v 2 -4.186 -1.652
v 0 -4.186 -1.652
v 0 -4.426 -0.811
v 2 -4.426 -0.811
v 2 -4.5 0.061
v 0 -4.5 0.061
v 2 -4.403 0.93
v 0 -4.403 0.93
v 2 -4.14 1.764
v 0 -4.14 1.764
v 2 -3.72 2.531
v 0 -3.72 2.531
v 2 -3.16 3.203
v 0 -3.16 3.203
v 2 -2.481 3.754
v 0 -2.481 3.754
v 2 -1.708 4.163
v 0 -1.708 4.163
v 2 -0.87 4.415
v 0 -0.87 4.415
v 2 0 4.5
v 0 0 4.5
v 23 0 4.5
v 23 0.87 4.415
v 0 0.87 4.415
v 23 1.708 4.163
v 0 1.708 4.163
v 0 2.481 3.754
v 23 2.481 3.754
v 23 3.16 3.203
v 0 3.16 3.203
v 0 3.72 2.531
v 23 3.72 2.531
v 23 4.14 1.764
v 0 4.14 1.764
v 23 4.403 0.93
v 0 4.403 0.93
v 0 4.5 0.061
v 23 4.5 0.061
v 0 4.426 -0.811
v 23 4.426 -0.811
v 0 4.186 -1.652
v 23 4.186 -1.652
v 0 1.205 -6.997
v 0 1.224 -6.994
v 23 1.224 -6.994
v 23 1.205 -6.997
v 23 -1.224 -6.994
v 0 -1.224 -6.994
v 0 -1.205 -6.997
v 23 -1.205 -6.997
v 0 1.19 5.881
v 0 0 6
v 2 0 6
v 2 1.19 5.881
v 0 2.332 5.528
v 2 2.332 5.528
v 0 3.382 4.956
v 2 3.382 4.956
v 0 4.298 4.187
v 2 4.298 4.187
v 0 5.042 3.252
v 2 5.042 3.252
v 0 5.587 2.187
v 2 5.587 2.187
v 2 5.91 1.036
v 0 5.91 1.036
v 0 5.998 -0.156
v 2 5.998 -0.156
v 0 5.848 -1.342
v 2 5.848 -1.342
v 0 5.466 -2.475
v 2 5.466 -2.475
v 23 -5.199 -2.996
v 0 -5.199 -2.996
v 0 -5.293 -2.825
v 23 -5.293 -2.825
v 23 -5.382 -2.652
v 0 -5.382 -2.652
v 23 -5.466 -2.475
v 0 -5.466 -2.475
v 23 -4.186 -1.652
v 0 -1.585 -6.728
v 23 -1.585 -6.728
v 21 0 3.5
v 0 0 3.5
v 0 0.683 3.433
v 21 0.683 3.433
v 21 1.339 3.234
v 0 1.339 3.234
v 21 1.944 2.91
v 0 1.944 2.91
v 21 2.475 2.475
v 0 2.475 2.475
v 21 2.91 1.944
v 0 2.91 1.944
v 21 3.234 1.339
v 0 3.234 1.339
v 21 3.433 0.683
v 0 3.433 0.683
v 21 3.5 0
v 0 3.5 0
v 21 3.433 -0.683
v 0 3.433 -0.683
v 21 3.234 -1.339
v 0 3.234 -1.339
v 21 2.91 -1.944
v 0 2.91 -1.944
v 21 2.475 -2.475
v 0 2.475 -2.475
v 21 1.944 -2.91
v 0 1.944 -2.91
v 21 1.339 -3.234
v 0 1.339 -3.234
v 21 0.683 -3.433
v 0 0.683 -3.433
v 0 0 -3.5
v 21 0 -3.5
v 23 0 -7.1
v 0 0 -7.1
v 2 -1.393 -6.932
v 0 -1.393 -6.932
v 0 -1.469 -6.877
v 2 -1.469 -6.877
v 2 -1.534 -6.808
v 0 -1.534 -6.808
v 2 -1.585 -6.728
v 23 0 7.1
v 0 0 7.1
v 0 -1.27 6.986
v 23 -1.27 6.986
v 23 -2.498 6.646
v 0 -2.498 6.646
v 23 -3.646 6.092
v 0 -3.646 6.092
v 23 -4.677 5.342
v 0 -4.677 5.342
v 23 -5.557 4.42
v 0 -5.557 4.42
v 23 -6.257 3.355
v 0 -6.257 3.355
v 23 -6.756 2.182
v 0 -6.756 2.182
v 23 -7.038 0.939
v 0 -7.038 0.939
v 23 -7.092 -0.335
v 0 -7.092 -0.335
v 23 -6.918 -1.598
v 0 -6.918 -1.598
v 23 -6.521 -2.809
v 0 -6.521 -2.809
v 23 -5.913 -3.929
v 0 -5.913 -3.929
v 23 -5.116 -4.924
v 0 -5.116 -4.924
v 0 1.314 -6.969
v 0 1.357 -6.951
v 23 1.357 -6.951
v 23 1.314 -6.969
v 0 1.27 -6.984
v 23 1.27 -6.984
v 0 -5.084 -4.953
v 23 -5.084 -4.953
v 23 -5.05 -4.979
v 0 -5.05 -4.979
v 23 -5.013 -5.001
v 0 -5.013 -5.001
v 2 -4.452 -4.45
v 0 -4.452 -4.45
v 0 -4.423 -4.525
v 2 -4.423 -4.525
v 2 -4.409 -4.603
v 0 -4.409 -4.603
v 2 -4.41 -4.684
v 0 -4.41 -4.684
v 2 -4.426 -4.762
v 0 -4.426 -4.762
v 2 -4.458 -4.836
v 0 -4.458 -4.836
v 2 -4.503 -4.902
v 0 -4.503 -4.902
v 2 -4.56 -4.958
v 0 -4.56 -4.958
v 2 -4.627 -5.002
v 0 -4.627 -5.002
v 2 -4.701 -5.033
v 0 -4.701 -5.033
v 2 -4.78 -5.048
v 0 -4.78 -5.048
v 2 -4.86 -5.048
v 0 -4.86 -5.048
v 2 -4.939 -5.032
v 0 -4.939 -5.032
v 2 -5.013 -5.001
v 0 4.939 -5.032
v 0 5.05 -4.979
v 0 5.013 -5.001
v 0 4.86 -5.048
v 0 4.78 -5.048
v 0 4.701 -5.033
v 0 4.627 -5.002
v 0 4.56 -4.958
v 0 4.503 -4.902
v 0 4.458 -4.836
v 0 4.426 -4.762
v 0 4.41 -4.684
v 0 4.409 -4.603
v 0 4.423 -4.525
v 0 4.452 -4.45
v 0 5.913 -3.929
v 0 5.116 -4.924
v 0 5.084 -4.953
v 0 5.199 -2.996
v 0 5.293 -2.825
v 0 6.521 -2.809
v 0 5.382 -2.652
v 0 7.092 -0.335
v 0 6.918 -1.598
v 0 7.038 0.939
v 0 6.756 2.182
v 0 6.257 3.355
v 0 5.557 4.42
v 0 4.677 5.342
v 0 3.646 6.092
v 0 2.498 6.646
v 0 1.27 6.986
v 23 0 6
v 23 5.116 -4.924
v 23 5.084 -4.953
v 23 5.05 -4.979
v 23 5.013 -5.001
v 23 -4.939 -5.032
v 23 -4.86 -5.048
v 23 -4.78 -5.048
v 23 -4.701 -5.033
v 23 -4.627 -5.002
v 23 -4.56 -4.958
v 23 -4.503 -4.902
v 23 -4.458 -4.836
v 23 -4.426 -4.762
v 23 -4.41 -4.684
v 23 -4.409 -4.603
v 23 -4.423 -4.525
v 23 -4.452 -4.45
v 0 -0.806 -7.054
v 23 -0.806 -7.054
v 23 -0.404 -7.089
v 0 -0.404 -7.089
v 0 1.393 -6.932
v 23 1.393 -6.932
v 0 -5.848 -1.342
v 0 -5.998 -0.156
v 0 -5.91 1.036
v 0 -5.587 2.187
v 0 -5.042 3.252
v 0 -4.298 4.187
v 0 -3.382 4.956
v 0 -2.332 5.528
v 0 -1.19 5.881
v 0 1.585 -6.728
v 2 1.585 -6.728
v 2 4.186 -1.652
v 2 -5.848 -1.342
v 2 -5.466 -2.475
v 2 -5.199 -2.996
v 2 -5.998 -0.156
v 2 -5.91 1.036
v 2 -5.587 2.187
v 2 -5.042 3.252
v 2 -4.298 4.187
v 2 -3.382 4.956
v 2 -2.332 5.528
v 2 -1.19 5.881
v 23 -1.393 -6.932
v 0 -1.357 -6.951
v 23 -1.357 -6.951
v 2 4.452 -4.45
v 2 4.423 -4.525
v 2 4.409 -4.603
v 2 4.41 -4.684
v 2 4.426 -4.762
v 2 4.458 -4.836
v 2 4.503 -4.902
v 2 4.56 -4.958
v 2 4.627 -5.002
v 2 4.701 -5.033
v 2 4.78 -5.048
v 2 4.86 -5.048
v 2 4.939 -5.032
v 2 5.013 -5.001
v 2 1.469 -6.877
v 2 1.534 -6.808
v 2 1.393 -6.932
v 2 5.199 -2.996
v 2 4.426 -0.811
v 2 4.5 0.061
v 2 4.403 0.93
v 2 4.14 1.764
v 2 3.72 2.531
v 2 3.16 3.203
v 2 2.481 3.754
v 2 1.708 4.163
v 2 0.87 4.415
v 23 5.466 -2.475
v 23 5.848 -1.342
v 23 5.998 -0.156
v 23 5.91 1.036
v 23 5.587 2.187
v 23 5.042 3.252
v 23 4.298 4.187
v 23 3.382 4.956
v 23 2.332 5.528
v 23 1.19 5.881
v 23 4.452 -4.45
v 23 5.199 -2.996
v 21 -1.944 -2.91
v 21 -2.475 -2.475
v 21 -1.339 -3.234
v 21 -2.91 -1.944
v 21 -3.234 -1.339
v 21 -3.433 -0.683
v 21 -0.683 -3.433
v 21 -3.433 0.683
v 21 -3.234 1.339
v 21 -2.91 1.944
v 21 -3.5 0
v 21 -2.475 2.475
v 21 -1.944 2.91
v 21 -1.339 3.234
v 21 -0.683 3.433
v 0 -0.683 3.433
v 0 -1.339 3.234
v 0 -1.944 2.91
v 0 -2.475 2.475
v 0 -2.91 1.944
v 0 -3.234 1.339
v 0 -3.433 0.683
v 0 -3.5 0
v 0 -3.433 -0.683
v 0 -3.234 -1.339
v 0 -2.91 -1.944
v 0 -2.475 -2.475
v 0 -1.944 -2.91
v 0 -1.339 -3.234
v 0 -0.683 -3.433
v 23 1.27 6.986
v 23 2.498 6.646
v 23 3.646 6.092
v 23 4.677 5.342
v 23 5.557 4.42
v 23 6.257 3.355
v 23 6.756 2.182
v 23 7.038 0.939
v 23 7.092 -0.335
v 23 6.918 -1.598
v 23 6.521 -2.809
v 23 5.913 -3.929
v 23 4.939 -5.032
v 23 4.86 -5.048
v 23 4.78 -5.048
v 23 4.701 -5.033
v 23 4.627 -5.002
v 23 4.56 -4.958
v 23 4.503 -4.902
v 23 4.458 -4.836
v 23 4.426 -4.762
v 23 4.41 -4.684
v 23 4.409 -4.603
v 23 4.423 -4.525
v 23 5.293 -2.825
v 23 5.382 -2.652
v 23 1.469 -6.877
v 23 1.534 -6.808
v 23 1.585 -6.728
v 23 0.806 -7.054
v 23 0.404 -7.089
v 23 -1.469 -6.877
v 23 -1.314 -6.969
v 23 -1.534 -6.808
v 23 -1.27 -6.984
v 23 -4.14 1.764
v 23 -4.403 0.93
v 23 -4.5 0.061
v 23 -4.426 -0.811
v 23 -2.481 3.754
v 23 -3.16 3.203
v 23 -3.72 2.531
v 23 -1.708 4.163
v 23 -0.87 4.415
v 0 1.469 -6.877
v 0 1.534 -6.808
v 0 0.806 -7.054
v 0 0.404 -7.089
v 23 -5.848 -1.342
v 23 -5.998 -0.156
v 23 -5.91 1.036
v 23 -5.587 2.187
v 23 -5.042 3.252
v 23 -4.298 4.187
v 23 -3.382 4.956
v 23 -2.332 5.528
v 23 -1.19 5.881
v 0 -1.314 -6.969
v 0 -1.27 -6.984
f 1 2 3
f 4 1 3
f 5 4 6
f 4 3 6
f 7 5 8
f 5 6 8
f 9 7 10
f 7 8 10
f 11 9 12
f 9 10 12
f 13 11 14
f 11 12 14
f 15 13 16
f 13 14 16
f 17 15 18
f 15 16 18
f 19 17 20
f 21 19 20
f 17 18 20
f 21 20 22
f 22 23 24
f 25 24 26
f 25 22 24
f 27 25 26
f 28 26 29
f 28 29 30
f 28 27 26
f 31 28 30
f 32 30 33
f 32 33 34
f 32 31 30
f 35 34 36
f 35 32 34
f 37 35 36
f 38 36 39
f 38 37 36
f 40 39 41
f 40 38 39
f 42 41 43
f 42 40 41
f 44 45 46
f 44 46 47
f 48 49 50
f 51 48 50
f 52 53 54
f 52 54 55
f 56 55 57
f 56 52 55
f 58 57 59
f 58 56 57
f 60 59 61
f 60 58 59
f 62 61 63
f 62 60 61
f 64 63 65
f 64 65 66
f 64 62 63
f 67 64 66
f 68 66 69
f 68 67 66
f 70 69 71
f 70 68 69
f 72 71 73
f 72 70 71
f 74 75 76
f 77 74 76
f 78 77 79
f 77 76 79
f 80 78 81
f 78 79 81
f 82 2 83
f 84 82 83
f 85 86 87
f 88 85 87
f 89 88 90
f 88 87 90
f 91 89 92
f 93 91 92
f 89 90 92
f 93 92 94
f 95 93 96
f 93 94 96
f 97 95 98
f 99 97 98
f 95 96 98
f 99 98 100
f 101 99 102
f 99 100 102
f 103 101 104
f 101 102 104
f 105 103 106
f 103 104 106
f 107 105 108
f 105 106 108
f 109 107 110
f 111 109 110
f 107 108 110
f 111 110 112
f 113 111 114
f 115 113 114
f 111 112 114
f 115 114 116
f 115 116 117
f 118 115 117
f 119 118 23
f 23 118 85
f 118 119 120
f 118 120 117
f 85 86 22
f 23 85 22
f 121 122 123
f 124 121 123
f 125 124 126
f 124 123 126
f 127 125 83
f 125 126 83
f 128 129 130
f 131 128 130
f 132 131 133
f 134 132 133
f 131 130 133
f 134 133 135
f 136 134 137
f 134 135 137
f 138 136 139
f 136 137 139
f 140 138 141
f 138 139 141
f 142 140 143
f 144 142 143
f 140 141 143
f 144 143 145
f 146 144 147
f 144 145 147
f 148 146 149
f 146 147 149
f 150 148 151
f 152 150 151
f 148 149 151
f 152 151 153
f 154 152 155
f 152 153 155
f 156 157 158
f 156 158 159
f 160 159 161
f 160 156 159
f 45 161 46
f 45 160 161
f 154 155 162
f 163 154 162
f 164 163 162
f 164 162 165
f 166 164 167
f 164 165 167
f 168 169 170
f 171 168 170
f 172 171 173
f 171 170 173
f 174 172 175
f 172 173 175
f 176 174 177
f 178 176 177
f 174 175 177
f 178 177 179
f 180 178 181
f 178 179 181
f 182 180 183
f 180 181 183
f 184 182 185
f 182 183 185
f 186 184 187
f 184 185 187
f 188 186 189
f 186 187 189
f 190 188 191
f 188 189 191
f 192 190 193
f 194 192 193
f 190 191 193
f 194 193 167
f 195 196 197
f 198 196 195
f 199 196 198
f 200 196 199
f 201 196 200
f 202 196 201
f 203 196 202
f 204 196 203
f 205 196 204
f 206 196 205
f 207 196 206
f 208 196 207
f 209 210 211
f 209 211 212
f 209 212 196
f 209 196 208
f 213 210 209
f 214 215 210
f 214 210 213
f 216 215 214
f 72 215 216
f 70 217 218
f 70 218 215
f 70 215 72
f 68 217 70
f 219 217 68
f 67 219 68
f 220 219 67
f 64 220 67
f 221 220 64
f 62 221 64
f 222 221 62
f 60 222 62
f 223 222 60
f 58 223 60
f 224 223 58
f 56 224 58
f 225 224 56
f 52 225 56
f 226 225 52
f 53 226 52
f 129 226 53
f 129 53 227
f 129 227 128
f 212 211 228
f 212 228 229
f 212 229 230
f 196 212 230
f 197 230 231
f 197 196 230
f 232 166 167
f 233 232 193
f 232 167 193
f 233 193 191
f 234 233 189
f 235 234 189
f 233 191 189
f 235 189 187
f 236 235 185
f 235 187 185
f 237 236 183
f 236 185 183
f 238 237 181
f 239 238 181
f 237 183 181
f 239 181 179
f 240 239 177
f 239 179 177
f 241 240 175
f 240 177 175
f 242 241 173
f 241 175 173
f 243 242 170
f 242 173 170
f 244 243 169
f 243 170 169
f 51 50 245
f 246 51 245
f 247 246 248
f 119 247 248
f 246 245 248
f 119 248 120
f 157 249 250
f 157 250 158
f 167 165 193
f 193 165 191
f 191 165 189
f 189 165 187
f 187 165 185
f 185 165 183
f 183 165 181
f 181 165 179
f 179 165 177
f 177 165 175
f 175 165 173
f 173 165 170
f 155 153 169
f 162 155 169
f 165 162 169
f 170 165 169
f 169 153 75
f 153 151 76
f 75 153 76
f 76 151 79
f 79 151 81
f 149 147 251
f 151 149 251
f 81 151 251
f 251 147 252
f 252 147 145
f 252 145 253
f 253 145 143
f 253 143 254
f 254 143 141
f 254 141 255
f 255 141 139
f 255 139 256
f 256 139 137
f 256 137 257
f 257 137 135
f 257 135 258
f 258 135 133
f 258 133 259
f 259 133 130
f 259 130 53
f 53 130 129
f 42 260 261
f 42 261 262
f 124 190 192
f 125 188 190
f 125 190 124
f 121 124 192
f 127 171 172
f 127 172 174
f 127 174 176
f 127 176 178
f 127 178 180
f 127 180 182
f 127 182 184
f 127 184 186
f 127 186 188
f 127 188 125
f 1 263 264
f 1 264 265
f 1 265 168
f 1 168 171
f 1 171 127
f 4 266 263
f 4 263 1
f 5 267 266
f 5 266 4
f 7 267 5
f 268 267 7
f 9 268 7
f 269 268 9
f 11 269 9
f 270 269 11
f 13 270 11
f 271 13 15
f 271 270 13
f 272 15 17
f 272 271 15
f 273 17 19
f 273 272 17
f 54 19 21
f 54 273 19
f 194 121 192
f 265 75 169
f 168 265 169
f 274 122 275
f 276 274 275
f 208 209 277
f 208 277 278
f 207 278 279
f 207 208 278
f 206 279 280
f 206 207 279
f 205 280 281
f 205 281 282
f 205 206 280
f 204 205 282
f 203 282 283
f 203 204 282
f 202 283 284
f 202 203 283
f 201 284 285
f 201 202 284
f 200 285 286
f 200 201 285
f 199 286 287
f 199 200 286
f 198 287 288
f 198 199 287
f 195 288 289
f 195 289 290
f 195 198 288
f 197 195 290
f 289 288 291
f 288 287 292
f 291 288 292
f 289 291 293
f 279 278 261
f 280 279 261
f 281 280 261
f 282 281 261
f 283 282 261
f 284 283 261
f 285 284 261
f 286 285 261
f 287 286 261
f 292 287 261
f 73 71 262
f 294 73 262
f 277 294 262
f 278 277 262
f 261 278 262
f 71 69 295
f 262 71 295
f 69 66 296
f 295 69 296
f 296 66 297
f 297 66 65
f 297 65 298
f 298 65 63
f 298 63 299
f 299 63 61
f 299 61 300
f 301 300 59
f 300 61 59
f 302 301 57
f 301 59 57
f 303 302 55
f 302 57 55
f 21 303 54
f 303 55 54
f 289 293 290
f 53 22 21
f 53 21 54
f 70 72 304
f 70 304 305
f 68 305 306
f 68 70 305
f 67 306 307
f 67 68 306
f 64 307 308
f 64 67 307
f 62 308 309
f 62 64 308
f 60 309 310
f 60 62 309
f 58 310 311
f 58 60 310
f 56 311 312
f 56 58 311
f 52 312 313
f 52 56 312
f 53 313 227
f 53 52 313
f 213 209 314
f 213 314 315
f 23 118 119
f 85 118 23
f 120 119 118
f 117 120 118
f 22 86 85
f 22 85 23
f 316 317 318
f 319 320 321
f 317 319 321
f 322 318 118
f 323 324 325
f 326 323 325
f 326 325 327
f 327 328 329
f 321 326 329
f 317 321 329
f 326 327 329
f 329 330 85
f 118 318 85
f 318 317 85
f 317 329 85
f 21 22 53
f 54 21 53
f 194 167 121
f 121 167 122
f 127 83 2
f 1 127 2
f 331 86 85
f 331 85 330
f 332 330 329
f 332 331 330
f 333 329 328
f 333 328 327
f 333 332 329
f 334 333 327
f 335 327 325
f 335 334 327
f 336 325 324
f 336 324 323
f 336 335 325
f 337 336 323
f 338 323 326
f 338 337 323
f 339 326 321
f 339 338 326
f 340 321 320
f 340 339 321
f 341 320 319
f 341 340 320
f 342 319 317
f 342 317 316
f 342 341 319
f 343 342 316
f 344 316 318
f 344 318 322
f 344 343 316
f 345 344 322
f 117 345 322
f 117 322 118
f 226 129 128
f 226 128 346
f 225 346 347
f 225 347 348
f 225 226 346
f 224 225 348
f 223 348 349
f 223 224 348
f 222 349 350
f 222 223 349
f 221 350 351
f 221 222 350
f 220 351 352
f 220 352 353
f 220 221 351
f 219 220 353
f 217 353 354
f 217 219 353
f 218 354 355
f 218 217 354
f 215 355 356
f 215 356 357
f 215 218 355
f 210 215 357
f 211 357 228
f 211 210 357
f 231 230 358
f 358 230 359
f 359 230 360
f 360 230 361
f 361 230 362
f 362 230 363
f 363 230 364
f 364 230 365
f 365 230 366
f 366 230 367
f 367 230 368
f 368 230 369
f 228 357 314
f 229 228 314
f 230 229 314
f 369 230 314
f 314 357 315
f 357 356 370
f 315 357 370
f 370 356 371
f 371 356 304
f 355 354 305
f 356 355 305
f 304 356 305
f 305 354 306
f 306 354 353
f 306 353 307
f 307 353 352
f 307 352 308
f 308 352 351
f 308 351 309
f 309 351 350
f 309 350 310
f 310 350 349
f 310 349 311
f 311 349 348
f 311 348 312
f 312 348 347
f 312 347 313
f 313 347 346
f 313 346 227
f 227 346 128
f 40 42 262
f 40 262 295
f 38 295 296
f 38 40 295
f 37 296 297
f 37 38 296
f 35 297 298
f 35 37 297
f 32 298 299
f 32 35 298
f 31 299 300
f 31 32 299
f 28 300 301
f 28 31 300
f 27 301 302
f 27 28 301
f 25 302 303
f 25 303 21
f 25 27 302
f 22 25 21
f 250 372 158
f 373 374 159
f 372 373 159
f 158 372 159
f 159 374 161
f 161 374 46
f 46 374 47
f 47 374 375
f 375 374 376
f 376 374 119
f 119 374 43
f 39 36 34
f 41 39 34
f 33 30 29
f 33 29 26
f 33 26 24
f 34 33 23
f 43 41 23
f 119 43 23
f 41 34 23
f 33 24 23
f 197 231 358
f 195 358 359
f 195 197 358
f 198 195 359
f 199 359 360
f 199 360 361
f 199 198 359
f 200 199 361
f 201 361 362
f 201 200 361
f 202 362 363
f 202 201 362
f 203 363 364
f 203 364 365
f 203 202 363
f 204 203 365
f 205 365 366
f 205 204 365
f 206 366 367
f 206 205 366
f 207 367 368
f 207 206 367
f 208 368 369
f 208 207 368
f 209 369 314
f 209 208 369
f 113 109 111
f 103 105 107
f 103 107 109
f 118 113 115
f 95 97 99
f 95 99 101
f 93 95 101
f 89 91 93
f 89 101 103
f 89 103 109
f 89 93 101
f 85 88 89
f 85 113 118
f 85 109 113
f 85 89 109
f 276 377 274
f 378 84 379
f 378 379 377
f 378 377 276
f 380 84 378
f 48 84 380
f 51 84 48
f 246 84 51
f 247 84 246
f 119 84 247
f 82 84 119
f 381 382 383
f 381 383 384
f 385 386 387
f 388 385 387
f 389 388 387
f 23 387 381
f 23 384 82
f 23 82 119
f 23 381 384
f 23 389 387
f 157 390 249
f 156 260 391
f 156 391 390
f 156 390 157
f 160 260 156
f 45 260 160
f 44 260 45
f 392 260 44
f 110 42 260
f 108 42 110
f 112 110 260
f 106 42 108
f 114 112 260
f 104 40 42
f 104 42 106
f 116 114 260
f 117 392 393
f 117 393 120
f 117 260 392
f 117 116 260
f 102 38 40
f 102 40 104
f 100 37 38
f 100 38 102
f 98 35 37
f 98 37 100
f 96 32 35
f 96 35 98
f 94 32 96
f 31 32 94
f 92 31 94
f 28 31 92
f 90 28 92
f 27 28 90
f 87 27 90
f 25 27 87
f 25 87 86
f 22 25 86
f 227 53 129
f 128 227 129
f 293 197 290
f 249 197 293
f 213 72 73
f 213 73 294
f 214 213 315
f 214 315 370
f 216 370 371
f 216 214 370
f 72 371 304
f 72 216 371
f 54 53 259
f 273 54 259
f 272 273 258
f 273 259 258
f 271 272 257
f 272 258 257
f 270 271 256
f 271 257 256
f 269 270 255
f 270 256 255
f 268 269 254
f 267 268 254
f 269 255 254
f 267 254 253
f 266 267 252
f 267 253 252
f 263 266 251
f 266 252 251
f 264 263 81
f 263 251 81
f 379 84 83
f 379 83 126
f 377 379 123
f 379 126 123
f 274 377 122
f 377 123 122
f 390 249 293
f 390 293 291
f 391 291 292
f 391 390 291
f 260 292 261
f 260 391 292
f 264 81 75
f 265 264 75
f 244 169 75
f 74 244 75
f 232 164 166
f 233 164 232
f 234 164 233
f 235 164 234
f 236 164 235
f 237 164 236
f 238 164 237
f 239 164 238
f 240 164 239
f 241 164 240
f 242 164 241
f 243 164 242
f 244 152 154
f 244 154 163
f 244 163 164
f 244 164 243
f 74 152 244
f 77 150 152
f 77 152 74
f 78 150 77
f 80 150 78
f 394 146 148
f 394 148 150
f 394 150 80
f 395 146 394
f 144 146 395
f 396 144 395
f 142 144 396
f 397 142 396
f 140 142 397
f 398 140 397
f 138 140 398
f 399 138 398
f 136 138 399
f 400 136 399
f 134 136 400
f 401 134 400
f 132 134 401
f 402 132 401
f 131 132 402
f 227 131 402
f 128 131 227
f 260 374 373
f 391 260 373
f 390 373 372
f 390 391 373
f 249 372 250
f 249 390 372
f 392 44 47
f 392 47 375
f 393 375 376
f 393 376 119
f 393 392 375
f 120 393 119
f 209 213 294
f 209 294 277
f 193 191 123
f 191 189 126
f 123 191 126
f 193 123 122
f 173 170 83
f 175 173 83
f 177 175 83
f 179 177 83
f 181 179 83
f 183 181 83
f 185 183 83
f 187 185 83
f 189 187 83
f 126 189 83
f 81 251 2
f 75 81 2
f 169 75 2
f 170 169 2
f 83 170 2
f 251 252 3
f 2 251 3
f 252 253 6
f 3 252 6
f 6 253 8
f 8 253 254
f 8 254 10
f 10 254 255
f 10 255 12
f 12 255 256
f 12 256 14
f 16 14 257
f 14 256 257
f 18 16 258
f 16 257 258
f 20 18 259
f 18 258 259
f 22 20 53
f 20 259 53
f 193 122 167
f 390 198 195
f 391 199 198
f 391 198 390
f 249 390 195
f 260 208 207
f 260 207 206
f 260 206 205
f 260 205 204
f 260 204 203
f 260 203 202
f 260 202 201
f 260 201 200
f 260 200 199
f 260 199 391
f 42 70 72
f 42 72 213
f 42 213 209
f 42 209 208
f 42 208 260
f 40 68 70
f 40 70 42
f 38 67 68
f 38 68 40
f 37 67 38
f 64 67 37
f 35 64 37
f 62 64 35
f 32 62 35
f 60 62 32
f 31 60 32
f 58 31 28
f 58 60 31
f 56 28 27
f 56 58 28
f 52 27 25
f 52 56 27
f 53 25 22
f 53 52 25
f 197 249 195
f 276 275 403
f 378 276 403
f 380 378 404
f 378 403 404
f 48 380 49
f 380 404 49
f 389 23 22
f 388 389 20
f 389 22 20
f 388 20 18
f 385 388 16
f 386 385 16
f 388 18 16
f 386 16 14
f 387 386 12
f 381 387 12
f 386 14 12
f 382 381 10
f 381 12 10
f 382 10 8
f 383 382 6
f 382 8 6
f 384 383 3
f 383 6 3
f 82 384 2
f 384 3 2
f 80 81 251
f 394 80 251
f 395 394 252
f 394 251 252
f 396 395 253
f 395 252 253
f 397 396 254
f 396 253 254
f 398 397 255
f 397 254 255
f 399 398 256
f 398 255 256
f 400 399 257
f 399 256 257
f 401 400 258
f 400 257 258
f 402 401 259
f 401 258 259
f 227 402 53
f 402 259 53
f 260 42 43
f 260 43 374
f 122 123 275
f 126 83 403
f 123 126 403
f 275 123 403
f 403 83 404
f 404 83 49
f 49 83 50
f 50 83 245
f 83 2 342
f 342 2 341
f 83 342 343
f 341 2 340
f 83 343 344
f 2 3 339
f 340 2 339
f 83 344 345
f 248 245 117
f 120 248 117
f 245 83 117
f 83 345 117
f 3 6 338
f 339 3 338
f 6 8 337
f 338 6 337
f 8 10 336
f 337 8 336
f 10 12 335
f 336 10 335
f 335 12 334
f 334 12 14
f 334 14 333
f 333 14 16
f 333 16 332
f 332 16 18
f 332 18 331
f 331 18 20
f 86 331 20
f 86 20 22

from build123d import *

# Parameters (mm, degrees)
F1_DEPTH = 23
F2_DEPTH = 2
F3_DEPTH = 23
F4_DEPTH = 21


with BuildPart() as f1:
    # F0 (on Right) → F1 (new body)
    with BuildSketch(Plane.YZ):
        with BuildLine():
            ThreePointArc((-5.465611, -2.475297), (-5.042409, 3.251786), (0, 6))
            Line((0, 6), (0, 7.1))
            ThreePointArc((0, 7.1), (-6.533266, 2.779648), (-5.115543, -4.923538))
            ThreePointArc((-5.115543, -4.923538), (-5.067157, -4.966482), (-5.012642, -5.001318))
            ThreePointArc((-5.012642, -5.001318), (-4.530016, -4.931471), (-4.452483, -4.45002))
            Line((-4.452483, -4.45002), (-5.19851, -2.995912))
            ThreePointArc((-5.19851, -2.995912), (-5.338411, -2.738862), (-5.465611, -2.475297))
        make_face()
        with BuildLine():
            ThreePointArc((0, -3.5), (-3.5, 0), (0, 3.5))
            Line((0, 3.5), (0, 4.5))
            ThreePointArc((0, 4.5), (-3.720455, 2.531445), (-4.185834, -1.651905))
            Line((-4.185834, -1.651905), (-1.584982, -6.728399))
            ThreePointArc((-1.584982, -6.728399), (-1.503297, -6.84399), (-1.392545, -6.932125))
            Line((-1.392545, -6.932125), (-1.356773, -6.951204))
            ThreePointArc((-1.356773, -6.951204), (-1.291931, -6.977086), (-1.22412, -6.993704))
            Line((-1.22412, -6.993704), (-1.205325, -6.996942))
            ThreePointArc((-1.205325, -6.996942), (-0.604862, -7.074188), (0, -7.1))
            Line((0, -7.1), (0, -3.5))
        make_face()
    extrude(amount=F1_DEPTH)

    # F0 (on Right) → F3 (join)
    with BuildSketch(Plane.YZ):
        with BuildLine():
            Line((0, -3.5), (0, 3.5))
            ThreePointArc((0, 3.5), (-3.5, 0), (0, -3.5))
        make_face()
    extrude(amount=F3_DEPTH)

    # F0 (on Right) → F4 (cut)
    with BuildSketch(Plane.YZ):
        with BuildLine():
            Line((0, -3.5), (0, 3.5))
            ThreePointArc((0, 3.5), (-3.5, 0), (0, -3.5))
        make_face()
    extrude(amount=F4_DEPTH, mode=Mode.SUBTRACT)


with BuildPart() as f2:
    # F0 (on Right) → F2 (new body)
    with BuildSketch(Plane.YZ):
        with BuildLine():
            ThreePointArc((-4.185834, -1.651905), (-3.720455, 2.531445), (0, 4.5))
            Line((0, 4.5), (0, 6))
            ThreePointArc((0, 6), (-5.042409, 3.251786), (-5.465611, -2.475297))
            Line((-5.465611, -2.475297), (-5.19851, -2.995912))
            Line((-5.19851, -2.995912), (-4.452483, -4.45002))
            ThreePointArc((-4.452483, -4.45002), (-4.530016, -4.931471), (-5.012642, -5.001318))
            Line((-5.012642, -5.001318), (-1.392545, -6.932125))
            ThreePointArc((-1.392545, -6.932125), (-1.503297, -6.84399), (-1.584982, -6.728399))
            Line((-1.584982, -6.728399), (-4.185834, -1.651905))
        make_face()
    extrude(amount=F2_DEPTH)


with BuildPart() as f5_1:
    # F5: instance of F1
    add(f1.part.mirror(Plane.XZ))


with BuildPart() as f5_2:
    # F5: instance of F2
    add(f2.part.mirror(Plane.XZ))


solid = Compound([f1.part, f2.part, f5_1.part, f5_2.part])
